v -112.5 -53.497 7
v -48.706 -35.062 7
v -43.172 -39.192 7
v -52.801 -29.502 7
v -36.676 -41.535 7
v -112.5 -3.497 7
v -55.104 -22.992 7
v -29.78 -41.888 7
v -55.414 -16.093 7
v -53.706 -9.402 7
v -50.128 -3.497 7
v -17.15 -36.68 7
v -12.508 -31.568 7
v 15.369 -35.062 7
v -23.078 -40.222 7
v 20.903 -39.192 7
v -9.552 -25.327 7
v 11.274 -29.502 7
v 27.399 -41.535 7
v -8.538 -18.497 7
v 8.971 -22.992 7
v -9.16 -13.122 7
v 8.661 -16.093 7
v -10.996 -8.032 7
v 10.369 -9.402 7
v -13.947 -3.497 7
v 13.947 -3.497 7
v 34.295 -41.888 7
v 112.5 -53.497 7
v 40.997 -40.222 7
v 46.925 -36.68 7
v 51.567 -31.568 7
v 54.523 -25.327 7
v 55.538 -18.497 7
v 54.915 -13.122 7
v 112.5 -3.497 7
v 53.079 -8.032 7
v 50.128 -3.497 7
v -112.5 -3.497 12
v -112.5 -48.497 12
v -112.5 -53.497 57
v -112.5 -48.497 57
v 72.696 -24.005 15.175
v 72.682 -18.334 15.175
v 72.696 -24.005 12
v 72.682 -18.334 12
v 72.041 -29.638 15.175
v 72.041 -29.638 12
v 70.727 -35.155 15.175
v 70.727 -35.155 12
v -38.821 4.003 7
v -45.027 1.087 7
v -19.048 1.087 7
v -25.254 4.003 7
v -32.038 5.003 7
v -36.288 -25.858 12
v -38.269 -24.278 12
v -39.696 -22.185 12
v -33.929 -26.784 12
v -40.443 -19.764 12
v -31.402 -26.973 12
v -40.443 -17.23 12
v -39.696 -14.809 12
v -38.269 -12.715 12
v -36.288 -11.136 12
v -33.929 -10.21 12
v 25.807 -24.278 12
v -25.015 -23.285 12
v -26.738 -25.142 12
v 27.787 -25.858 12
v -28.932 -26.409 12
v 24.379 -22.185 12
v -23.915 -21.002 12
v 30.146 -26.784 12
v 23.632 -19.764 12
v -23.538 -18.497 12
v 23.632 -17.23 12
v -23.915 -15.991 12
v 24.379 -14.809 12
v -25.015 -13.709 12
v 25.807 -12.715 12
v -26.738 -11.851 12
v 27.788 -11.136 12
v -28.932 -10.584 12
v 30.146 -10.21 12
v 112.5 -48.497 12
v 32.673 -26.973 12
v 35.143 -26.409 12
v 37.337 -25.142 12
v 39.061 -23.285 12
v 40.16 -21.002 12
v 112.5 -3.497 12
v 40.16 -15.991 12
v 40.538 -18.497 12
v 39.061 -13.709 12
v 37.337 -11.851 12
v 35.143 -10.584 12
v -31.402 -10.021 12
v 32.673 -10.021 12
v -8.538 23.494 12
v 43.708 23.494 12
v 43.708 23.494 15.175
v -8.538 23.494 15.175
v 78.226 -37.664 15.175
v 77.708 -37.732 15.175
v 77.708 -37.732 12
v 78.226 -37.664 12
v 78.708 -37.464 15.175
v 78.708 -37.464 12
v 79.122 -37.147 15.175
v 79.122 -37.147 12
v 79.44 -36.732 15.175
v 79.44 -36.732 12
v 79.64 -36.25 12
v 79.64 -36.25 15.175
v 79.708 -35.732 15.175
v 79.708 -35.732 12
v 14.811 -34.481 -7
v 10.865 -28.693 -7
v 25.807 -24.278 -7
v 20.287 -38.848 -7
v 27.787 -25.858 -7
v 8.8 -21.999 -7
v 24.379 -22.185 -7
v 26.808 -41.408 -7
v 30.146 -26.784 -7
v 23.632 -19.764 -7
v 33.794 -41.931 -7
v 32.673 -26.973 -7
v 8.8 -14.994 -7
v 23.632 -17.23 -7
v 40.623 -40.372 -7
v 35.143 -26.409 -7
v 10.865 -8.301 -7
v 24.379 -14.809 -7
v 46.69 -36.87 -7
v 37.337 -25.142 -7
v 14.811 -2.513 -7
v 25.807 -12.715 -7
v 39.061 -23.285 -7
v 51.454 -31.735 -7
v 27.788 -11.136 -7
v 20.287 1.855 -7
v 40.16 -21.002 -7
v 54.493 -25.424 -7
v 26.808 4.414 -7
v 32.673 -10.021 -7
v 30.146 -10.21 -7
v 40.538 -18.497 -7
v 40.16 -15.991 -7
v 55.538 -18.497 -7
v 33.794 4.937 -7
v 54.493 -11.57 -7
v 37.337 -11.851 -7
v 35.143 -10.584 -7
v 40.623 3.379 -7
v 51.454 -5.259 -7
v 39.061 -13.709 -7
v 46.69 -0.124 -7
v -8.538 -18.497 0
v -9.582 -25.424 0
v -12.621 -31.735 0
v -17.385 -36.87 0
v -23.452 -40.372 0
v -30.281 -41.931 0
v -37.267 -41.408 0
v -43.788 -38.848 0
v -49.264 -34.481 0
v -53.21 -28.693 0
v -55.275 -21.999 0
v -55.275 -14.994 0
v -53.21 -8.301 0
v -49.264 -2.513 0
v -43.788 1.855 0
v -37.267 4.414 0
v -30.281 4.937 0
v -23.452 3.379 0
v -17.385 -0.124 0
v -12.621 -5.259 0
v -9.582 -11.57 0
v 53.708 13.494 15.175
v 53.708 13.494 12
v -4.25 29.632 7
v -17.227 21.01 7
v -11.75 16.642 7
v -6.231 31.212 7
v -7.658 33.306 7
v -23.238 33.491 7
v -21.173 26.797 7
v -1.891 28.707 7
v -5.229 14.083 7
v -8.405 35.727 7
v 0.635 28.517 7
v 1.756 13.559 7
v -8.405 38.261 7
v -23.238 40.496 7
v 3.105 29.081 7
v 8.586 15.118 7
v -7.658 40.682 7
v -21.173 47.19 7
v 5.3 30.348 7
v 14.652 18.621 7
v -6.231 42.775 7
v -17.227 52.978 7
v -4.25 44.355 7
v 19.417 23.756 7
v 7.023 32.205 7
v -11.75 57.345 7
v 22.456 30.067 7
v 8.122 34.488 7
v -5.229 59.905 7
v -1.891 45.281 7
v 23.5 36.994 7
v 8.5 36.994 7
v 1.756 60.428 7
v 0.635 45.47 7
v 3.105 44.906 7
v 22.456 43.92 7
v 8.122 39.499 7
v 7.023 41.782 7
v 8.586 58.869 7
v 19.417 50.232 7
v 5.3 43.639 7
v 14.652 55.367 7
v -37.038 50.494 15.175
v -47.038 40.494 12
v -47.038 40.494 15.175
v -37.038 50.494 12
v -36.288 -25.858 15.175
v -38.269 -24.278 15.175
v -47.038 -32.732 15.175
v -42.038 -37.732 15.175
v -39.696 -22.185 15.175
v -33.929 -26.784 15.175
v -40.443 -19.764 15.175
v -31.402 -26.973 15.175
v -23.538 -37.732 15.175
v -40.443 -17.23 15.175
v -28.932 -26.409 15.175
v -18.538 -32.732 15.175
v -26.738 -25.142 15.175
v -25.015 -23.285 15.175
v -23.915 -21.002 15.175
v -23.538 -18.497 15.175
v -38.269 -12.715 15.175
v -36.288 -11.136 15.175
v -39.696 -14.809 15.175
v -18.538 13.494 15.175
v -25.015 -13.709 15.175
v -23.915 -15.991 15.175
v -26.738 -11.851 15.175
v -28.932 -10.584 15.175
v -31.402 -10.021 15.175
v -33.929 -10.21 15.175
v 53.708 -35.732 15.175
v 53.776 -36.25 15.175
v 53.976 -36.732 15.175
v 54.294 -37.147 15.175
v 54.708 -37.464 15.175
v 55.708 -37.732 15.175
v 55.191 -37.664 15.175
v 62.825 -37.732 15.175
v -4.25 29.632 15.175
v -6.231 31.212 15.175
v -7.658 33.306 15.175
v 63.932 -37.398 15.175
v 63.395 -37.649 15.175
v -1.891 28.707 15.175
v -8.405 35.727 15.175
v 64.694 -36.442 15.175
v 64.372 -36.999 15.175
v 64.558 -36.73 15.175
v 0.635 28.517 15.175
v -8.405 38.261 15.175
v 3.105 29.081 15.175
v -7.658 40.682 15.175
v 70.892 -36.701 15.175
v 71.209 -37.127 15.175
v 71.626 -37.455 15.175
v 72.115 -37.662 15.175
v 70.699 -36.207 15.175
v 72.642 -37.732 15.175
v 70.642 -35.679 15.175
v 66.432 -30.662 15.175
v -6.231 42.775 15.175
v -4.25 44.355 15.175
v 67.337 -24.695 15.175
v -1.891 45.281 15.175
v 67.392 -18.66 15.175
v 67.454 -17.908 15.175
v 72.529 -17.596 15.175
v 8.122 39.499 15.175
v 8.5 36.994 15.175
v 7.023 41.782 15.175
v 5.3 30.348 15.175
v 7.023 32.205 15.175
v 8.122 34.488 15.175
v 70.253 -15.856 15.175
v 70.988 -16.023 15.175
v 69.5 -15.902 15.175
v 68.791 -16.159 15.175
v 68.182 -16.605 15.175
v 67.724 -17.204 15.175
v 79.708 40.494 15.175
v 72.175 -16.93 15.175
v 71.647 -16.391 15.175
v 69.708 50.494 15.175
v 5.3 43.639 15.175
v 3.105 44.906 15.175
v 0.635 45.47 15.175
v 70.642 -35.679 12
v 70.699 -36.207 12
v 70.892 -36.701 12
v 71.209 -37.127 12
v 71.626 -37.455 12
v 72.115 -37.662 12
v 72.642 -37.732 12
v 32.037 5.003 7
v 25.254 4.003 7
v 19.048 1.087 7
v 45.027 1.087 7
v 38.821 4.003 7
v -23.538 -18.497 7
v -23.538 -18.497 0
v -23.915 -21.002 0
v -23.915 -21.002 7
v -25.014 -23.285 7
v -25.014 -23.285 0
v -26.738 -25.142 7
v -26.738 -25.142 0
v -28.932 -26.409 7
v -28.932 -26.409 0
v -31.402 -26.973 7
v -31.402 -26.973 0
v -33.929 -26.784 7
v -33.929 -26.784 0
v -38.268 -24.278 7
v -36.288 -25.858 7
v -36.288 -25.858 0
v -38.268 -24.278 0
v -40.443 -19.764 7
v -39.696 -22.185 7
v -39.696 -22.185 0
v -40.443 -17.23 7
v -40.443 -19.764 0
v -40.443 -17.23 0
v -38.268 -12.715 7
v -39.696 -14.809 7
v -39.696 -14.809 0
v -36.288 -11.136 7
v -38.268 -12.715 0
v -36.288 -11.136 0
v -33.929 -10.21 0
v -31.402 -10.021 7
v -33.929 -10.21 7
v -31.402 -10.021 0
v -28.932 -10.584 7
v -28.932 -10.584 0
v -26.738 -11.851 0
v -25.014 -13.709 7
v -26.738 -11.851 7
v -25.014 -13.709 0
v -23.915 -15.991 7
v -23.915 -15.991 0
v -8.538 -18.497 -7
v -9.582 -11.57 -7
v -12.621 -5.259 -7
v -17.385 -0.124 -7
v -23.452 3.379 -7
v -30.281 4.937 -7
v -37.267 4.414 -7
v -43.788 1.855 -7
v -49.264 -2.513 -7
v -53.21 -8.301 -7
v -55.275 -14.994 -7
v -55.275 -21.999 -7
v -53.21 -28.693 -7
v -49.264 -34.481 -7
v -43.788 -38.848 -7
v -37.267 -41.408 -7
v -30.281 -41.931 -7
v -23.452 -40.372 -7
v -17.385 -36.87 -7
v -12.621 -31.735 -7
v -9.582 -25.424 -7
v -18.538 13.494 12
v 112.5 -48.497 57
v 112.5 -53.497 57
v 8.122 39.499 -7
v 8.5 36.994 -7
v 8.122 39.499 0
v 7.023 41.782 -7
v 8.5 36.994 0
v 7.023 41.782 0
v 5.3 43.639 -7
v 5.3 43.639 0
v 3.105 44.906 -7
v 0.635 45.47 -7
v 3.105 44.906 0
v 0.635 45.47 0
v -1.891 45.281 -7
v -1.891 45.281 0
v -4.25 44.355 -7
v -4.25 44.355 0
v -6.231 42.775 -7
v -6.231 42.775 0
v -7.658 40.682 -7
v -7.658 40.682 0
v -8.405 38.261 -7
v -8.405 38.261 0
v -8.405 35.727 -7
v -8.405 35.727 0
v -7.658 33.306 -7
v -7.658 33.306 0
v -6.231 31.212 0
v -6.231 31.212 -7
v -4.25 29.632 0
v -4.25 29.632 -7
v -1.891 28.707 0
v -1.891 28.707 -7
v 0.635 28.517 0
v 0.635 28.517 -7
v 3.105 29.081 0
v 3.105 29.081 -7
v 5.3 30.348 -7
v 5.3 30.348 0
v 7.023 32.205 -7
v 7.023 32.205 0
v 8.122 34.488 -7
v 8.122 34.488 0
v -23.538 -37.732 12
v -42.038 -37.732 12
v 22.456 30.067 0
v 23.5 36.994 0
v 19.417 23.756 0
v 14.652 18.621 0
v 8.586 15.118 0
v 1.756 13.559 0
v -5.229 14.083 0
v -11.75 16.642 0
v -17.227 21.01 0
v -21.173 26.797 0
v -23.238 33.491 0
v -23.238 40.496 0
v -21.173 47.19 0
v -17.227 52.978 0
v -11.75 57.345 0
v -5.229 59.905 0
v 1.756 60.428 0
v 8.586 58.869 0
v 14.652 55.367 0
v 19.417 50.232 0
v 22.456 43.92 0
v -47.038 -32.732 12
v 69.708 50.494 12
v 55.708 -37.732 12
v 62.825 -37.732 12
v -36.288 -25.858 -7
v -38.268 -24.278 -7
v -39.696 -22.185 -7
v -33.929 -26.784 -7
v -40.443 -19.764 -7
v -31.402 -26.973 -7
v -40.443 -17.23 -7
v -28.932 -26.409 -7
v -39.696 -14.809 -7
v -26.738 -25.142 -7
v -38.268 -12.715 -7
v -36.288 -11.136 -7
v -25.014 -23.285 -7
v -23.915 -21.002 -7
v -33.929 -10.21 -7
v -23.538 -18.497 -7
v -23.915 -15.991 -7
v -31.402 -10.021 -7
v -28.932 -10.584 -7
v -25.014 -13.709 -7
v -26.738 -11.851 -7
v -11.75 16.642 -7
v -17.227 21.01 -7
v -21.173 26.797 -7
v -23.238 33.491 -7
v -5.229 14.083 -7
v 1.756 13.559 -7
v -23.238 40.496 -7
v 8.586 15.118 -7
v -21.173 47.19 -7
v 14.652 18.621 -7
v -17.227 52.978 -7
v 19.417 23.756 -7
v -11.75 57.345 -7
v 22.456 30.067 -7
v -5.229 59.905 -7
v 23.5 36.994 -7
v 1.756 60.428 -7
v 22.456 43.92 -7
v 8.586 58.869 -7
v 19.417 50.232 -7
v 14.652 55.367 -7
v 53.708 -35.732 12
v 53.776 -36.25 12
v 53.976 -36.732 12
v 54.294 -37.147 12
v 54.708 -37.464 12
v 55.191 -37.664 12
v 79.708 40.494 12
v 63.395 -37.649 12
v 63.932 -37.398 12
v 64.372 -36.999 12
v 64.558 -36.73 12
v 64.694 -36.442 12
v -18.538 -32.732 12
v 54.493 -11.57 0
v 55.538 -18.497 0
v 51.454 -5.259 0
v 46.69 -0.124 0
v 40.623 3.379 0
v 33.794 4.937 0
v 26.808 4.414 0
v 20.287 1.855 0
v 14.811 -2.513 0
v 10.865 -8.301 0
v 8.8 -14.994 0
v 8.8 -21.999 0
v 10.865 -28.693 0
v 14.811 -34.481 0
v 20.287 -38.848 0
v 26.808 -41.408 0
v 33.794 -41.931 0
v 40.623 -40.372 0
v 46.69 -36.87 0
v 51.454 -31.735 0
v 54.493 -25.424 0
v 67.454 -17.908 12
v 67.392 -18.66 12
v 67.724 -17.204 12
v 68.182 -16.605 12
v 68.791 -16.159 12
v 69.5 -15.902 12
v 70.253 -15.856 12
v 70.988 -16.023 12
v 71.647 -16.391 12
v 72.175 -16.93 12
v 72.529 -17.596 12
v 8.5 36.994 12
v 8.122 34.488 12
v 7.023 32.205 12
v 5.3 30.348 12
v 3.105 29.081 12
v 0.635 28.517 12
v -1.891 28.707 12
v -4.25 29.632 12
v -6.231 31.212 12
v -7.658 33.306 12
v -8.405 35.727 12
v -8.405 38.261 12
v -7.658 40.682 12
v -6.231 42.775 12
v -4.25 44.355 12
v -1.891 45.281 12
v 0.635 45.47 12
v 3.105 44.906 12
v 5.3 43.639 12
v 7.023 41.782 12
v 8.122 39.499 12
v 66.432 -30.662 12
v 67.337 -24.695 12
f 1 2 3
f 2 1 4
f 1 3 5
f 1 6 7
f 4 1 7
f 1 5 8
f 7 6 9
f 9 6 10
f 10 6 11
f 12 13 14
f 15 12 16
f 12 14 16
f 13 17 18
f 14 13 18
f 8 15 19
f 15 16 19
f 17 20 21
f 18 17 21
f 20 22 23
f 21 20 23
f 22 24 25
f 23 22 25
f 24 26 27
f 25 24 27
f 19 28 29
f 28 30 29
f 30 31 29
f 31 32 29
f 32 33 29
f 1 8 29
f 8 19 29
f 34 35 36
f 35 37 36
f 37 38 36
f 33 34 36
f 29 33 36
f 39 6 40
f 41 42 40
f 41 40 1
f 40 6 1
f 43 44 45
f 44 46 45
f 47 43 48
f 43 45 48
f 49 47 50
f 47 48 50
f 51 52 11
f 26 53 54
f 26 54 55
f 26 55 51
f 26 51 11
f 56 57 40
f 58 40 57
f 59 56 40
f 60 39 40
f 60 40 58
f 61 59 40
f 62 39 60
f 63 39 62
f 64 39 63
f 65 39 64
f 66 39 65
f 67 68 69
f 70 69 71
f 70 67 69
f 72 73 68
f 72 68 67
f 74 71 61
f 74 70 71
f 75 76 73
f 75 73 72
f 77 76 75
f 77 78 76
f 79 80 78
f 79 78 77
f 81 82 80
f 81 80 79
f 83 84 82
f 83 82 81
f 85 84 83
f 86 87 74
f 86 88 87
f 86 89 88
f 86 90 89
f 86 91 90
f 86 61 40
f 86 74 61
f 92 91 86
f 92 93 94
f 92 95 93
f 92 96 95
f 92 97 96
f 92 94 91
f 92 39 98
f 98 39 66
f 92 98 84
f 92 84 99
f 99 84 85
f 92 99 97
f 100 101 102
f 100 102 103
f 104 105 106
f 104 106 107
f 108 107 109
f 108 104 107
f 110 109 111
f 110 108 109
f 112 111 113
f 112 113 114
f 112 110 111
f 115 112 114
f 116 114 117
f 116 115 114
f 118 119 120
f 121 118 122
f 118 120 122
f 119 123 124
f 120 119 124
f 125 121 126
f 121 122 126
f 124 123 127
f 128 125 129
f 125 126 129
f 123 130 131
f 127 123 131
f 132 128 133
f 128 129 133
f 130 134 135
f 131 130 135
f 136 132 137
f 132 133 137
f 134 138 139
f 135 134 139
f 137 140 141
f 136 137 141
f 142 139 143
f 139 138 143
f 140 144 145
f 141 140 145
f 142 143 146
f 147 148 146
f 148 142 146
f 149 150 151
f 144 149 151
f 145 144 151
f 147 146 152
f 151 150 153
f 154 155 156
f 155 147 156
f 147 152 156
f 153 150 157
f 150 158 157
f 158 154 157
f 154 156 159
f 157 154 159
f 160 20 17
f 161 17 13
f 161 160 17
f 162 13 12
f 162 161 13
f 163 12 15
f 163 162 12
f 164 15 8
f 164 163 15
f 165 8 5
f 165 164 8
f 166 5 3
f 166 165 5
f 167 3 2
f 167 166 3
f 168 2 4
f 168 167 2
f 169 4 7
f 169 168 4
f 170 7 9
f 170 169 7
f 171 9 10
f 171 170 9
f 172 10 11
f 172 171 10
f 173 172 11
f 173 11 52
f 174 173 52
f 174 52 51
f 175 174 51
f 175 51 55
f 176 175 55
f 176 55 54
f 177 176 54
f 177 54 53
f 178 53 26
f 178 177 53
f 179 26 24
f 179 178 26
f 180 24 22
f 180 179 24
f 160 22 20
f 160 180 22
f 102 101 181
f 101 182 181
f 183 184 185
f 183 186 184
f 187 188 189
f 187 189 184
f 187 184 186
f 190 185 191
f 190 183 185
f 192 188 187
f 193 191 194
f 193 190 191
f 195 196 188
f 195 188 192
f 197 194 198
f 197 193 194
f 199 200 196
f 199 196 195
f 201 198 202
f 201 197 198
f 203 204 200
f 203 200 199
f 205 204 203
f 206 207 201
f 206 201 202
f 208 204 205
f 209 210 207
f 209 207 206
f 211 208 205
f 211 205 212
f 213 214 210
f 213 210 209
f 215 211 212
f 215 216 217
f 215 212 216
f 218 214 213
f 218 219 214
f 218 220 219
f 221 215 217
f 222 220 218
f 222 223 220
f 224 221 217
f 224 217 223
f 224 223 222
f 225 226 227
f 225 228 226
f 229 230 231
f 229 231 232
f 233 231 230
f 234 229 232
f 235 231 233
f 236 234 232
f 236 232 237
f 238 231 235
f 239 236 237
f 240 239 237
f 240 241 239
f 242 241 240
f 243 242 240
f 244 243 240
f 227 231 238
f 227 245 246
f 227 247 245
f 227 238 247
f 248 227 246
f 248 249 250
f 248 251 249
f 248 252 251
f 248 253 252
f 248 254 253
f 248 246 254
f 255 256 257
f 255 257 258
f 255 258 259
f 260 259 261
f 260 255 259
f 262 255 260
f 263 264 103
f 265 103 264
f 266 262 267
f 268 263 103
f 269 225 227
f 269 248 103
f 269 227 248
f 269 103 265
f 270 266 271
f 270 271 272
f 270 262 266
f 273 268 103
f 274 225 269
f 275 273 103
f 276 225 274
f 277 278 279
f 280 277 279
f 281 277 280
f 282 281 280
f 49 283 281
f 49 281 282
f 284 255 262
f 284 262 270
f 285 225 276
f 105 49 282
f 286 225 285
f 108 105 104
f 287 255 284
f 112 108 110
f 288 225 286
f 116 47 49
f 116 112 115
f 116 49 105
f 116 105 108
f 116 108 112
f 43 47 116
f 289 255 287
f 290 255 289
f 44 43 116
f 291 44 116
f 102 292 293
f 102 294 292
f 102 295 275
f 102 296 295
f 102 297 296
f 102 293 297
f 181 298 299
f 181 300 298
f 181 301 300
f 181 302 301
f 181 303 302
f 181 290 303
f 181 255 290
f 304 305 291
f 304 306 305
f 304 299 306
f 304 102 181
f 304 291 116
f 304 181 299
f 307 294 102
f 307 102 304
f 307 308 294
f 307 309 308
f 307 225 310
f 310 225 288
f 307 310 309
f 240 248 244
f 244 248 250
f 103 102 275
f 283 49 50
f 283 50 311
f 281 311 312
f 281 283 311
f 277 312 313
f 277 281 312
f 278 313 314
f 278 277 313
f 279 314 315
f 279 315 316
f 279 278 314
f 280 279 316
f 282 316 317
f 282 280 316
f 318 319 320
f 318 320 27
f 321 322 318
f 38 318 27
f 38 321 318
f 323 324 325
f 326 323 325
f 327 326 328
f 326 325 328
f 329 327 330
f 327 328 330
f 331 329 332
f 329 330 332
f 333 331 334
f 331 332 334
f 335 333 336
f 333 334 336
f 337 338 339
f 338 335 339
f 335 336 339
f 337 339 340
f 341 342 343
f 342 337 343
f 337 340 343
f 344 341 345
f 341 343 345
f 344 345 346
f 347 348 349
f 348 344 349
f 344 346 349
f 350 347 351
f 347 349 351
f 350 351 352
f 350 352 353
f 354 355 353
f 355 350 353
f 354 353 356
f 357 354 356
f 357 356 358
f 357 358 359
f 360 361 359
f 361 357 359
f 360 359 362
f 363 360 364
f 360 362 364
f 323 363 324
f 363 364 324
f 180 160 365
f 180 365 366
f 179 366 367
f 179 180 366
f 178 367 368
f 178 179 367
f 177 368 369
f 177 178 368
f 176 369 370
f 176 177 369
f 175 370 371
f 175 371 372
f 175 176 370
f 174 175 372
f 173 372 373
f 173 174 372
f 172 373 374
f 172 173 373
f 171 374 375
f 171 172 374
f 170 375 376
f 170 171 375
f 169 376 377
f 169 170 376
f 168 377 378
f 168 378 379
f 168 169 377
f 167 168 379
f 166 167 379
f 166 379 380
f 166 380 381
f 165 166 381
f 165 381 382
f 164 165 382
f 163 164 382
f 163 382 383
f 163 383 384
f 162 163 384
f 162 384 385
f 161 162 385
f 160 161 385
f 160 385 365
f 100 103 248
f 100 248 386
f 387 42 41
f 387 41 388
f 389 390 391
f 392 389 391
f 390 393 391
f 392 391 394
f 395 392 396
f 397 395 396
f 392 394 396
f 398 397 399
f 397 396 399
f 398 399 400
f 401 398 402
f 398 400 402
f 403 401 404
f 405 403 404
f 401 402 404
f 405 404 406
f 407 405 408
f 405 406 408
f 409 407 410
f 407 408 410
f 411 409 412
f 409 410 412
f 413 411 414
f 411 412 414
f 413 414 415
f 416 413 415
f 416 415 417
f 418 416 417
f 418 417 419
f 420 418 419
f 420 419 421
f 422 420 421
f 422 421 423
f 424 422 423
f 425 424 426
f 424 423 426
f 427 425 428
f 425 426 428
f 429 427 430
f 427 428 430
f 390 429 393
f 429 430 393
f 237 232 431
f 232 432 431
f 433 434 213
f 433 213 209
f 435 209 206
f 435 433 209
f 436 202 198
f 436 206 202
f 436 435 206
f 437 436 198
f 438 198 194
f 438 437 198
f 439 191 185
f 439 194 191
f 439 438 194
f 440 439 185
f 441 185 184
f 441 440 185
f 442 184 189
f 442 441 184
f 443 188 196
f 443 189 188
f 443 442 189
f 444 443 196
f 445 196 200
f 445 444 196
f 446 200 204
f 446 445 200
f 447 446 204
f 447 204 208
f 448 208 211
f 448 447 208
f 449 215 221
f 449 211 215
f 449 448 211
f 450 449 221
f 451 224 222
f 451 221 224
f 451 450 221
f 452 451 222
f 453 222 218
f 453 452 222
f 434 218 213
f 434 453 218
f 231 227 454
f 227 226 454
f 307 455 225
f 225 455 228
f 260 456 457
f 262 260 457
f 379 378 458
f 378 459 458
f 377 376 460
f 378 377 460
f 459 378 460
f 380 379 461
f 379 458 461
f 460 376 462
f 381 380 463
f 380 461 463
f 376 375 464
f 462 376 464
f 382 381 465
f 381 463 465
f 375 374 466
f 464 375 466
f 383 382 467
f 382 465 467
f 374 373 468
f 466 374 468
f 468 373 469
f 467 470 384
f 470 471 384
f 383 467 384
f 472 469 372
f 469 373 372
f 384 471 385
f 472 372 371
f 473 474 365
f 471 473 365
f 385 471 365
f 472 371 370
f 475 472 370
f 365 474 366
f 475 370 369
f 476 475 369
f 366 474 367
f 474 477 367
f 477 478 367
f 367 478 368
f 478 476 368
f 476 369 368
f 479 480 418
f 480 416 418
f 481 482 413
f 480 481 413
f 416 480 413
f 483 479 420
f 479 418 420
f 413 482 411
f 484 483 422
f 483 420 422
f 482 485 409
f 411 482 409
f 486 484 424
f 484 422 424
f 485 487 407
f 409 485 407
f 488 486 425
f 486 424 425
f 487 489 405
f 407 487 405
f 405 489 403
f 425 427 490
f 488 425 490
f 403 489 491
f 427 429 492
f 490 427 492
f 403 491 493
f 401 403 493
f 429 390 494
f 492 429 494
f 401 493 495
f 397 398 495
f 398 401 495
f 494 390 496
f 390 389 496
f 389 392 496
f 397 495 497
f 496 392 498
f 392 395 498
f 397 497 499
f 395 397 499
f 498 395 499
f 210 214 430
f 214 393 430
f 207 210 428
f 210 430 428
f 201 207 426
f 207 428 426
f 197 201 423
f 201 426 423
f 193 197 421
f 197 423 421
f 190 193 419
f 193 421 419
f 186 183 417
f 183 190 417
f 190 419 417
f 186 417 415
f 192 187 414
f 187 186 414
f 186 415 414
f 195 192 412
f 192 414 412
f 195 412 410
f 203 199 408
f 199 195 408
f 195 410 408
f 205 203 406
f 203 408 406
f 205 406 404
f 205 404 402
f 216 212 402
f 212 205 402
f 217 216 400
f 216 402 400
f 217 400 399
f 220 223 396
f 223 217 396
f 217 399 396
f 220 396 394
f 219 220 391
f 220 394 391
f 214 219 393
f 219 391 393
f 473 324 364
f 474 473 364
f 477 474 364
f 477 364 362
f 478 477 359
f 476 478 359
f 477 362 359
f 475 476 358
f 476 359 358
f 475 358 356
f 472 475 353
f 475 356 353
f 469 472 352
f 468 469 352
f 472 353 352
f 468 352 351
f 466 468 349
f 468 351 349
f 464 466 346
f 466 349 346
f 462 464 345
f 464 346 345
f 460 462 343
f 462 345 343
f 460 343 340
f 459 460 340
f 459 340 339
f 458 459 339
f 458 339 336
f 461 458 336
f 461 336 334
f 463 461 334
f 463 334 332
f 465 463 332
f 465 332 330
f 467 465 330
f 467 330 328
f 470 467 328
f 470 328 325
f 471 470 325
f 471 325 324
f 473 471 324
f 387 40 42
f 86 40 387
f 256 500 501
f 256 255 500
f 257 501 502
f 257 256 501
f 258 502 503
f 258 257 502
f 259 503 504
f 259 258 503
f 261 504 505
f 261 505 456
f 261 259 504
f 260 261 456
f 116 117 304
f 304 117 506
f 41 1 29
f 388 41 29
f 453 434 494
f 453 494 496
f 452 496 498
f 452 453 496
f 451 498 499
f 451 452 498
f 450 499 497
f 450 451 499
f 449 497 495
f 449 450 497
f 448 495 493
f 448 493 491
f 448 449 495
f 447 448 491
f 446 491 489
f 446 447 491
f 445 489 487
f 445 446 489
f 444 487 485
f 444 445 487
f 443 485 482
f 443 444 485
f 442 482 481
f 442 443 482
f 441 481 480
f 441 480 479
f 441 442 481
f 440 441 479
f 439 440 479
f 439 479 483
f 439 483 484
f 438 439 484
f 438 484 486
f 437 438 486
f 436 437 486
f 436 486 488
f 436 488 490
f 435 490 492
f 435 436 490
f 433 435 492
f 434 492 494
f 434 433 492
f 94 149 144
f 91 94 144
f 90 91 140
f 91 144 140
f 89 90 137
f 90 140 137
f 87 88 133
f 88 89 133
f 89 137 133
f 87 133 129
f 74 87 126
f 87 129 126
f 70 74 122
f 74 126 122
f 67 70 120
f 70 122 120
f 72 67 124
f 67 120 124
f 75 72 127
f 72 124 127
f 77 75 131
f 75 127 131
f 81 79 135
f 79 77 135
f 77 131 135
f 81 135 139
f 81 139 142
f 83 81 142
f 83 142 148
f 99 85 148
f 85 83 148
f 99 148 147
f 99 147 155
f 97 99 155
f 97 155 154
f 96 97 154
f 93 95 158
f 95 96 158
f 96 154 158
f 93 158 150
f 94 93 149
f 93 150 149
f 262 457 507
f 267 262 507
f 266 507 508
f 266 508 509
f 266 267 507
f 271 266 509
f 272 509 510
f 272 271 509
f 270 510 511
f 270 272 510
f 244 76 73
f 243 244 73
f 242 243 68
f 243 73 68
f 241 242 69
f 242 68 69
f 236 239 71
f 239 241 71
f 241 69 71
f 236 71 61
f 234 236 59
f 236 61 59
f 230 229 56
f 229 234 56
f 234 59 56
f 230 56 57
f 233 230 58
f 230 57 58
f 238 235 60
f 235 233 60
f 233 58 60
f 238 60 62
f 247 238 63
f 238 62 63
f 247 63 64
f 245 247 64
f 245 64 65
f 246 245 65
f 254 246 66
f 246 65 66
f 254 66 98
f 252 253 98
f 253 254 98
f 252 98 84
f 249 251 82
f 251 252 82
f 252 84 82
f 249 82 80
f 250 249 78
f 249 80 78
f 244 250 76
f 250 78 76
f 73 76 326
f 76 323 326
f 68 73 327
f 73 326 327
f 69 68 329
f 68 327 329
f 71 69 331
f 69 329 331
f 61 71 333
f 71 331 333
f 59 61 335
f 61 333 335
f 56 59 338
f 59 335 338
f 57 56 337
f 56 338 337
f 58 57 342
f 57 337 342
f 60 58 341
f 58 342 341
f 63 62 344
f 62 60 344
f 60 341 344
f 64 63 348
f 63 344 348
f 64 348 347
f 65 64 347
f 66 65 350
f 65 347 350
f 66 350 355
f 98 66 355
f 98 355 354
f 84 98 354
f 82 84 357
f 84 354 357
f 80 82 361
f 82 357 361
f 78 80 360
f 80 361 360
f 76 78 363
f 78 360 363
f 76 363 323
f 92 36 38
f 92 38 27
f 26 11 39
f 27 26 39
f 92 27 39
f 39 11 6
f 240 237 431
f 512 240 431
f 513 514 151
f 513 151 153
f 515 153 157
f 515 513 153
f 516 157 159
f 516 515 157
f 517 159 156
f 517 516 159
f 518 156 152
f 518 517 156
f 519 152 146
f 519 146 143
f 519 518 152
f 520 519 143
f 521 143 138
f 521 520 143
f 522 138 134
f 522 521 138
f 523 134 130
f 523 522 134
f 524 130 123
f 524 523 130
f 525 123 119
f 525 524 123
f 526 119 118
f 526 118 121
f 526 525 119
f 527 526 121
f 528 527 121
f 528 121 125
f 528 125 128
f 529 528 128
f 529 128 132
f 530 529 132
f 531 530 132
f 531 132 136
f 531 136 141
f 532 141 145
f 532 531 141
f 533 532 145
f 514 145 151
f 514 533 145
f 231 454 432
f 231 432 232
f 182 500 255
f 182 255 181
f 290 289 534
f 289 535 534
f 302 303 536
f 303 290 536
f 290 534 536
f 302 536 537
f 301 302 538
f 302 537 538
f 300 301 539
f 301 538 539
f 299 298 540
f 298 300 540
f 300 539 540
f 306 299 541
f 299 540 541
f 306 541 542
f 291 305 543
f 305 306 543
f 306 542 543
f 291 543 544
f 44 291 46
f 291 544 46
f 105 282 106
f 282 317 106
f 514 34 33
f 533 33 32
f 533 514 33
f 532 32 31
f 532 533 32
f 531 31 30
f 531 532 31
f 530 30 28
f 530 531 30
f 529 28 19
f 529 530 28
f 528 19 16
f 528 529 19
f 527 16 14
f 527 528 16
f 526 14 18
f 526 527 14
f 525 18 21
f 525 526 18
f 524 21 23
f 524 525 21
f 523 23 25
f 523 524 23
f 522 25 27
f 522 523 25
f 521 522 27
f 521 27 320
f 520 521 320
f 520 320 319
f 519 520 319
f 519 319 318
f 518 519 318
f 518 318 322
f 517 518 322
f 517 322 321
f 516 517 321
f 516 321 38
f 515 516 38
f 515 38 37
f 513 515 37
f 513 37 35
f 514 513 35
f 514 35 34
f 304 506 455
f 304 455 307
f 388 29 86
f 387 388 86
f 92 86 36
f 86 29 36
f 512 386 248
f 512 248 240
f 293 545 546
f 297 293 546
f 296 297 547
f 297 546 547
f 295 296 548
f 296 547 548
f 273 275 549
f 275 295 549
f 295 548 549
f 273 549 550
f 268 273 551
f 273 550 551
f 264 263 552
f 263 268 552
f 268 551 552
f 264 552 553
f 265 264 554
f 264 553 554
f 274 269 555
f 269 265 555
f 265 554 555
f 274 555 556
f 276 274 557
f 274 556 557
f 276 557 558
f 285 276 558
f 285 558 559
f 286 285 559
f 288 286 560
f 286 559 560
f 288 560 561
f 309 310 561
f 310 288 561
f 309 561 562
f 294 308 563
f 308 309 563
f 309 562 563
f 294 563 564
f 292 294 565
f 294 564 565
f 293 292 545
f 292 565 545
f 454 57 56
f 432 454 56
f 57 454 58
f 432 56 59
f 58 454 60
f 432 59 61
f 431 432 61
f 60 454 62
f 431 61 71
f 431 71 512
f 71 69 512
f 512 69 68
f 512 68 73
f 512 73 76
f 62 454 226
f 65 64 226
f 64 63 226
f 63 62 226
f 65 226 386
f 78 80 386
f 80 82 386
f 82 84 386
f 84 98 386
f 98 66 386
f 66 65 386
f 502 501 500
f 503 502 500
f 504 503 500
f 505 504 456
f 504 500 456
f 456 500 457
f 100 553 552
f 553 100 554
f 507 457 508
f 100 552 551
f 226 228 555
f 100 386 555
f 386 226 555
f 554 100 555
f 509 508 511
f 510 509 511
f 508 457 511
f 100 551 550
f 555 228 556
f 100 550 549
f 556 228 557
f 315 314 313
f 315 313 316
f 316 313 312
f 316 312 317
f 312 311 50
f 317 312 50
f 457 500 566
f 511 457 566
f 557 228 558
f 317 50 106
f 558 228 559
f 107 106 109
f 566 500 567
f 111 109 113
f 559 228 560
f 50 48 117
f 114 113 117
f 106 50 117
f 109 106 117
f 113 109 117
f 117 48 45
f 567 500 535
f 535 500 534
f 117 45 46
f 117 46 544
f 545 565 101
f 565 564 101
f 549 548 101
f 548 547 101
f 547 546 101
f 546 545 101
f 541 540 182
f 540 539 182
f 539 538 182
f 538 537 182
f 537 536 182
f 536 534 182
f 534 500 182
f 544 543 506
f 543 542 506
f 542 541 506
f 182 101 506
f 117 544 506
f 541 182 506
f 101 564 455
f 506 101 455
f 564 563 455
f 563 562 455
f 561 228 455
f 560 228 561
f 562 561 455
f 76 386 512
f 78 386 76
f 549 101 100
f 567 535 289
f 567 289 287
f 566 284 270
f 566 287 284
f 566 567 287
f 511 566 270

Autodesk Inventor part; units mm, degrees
sketch "Sketch1" plane through (0, 0, 0) normal (0, 0, 1) x (1, 0, 0)
  circle A0 centre (0, 0) radius 13.4938 construction
  circle A1 centre (0, 36.9937) radius 8.5
  circle A2 centre (0, 36.9937) radius 23.5
  circle A3 centre (-32.0375, -18.4969) radius 23.5
  circle A4 centre (-32.0375, -18.4969) radius 8.5
  circle A5 centre (32.0375, -18.4969) radius 23.5
  circle A6 centre (32.0375, -18.4969) radius 8.5
  dimension "d0" = 26.9875
  dimension "d1" = 17
  dimension "d2" = 47
  dimension "d5" = 360
  dimension "d25" = 64.0751
extrude "Extrusion1" add sketch "Sketch1" along normal mid plane 14
sketch "Sketch4" plane through (32.0375, -18.4969, 7) normal (0, 0, 1) x (1, 0, 0)
  line L0 (-144.5375, -35) -> (80.4625, -35)
  line L1 (80.4625, -35) -> (80.4625, 15)
  line L2 (80.4625, 15) -> (-144.5375, 15)
  line L3 (-144.5375, 15) -> (-144.5375, -35)
  line L4 (-144.5375, -35) -> (80.4625, 15) construction
  line L5 (80.4625, -35) -> (-144.5375, 15) construction
  line L6 (-32.0375, 101.7888) -> (-32.0375, -57.7981) projected
  circle A0 centre (0, 0) radius 8.5 projected
  circle A1 centre (-64.0751, 0) radius 8.5 projected
  point P0 (-32.0375, 18.4969)
  point P1 (-32.0375, -10)
  dimension "d16" = 50
  dimension "d17" = 225
  dimension "d18" = 0
  dimension "d19" = 15
extrude "Extrusion3" add sketch "Sketch4" along normal blind 5
sketch "Sketch5" plane through (32.0375, -18.4969, 12) normal (0, 0, 1) x (1, 0, 0)
  line L0 (-144.5375, -35) -> (80.4625, -35) projected
  line L1 (-144.5375, 15) -> (-144.5375, -35) projected
  line L2 (80.4625, -35) -> (80.4625, 15) projected
  line L3 (-144.5375, -30) -> (80.4625, -30)
  point P0 (-32.0375, 18.4969)
  dimension "d22" = 5
extrude "Extrusion4" add sketch "Sketch5" along normal blind 45
sketch "Sketch6" plane through (32.0375, -18.4969, 12) normal (0, 0, 1) x (1, 0, 0)
  circle A0 centre (-32.0375, 18.4969) radius 13.4938 construction
  circle A1 centre (-32.0375, 55.4906) radius 23.5 projected
  circle A2 centre (-32.0375, 55.4906) radius 8.5 projected
  circle A3 centre (-64.0751, 0) radius 8.5 projected
  circle A4 centre (-64.0751, 0) radius 8.5 projected
  line L0 (47.6707, -19.2354) -> (47.6707, 68.9906)
  line L1 (47.6707, 68.9906) -> (-79.0751, 68.9906)
  line L2 (-79.0751, 68.9906) -> (-79.0751, -19.2354)
  circle A5 centre (-64.0751, 0) radius 23.5 projected
  line L3 (-50.5751, -19.2354) -> (21.6707, -19.2354)
  line L4 (21.6707, -19.2354) -> (21.6707, 41.9906)
  line L5 (21.6707, 41.9906) -> (-50.5751, 41.9906)
  line L6 (-50.5751, 41.9906) -> (-50.5751, -19.2354)
  arc A6 (18.0901, 15) -> (-18.0901, 15) centre (0, 0) ccw projected
  arc A7 (-18.0901, 15) -> (18.0901, 15) centre (0, 0) ccw projected
  arc A8 (35, -19.2354) -> (37.509, -10) centre (-7.2886, -2.7883) ccw construction
  arc A9 (37.8316, -19.2354) -> (40.645, 0.1628) centre (-7.2886, -2.7883) ccw
  arc A10 (32.5302, -18.2748) -> (35.355, -0.1628) centre (-7.2886, -2.7883) ccw
  arc A11 (40.645, 0.1628) -> (35.355, -0.1628) centre (38, 0) ccw
  arc A12 (32.5302, -18.2748) -> (32.35, -19.2354) centre (35, -19.2354) ccw
  line L7 (-79.0751, -19.2354) -> (32.35, -19.2354)
  line L8 (37.8316, -19.2354) -> (47.6707, -19.2354)
  dimension "d26" = 5
  dimension "d27" = 13.5
  dimension "d28" = 15
  dimension "d30" = 13.5
  dimension "d32" = 28.5
  dimension "d33" = 26
extrude "Extrusion5" add sketch "Sketch6" along normal blind 3.175 separate body contours A1 L5 L6 L1 | A1 L1 L0 L8 A9 A11 A10 A12 L7 L4 A7 L5 | A1 L6 A5 L2 L1 | L6 L7 A5 L2 | A7 L4 | A5 L7 L2
chamfer "Chamfer1" distance 10 angle 45 1 edges at (-18.5375, 23.4938, 13.5875)
chamfer "Chamfer2" distance 10 angle 45 3 edges at (-47.0375, 50.4937, 13.5875) (79.7082, 50.4938, 13.5875) (53.7082, 23.4938, 13.5875)
fillet "Fillet1" radius 2 4 edges at (53.7082, -37.7323, 13.5875) (64.3875, -37.7323, 13.5875) (79.7082, -37.7323, 13.5875) (69.8691, -37.7323, 13.5875)
chamfer "Chamfer3" distance 5 angle 45 2 edges at (-47.0375, -37.7323, 13.5875) (-18.5375, -37.7323, 13.5875)
